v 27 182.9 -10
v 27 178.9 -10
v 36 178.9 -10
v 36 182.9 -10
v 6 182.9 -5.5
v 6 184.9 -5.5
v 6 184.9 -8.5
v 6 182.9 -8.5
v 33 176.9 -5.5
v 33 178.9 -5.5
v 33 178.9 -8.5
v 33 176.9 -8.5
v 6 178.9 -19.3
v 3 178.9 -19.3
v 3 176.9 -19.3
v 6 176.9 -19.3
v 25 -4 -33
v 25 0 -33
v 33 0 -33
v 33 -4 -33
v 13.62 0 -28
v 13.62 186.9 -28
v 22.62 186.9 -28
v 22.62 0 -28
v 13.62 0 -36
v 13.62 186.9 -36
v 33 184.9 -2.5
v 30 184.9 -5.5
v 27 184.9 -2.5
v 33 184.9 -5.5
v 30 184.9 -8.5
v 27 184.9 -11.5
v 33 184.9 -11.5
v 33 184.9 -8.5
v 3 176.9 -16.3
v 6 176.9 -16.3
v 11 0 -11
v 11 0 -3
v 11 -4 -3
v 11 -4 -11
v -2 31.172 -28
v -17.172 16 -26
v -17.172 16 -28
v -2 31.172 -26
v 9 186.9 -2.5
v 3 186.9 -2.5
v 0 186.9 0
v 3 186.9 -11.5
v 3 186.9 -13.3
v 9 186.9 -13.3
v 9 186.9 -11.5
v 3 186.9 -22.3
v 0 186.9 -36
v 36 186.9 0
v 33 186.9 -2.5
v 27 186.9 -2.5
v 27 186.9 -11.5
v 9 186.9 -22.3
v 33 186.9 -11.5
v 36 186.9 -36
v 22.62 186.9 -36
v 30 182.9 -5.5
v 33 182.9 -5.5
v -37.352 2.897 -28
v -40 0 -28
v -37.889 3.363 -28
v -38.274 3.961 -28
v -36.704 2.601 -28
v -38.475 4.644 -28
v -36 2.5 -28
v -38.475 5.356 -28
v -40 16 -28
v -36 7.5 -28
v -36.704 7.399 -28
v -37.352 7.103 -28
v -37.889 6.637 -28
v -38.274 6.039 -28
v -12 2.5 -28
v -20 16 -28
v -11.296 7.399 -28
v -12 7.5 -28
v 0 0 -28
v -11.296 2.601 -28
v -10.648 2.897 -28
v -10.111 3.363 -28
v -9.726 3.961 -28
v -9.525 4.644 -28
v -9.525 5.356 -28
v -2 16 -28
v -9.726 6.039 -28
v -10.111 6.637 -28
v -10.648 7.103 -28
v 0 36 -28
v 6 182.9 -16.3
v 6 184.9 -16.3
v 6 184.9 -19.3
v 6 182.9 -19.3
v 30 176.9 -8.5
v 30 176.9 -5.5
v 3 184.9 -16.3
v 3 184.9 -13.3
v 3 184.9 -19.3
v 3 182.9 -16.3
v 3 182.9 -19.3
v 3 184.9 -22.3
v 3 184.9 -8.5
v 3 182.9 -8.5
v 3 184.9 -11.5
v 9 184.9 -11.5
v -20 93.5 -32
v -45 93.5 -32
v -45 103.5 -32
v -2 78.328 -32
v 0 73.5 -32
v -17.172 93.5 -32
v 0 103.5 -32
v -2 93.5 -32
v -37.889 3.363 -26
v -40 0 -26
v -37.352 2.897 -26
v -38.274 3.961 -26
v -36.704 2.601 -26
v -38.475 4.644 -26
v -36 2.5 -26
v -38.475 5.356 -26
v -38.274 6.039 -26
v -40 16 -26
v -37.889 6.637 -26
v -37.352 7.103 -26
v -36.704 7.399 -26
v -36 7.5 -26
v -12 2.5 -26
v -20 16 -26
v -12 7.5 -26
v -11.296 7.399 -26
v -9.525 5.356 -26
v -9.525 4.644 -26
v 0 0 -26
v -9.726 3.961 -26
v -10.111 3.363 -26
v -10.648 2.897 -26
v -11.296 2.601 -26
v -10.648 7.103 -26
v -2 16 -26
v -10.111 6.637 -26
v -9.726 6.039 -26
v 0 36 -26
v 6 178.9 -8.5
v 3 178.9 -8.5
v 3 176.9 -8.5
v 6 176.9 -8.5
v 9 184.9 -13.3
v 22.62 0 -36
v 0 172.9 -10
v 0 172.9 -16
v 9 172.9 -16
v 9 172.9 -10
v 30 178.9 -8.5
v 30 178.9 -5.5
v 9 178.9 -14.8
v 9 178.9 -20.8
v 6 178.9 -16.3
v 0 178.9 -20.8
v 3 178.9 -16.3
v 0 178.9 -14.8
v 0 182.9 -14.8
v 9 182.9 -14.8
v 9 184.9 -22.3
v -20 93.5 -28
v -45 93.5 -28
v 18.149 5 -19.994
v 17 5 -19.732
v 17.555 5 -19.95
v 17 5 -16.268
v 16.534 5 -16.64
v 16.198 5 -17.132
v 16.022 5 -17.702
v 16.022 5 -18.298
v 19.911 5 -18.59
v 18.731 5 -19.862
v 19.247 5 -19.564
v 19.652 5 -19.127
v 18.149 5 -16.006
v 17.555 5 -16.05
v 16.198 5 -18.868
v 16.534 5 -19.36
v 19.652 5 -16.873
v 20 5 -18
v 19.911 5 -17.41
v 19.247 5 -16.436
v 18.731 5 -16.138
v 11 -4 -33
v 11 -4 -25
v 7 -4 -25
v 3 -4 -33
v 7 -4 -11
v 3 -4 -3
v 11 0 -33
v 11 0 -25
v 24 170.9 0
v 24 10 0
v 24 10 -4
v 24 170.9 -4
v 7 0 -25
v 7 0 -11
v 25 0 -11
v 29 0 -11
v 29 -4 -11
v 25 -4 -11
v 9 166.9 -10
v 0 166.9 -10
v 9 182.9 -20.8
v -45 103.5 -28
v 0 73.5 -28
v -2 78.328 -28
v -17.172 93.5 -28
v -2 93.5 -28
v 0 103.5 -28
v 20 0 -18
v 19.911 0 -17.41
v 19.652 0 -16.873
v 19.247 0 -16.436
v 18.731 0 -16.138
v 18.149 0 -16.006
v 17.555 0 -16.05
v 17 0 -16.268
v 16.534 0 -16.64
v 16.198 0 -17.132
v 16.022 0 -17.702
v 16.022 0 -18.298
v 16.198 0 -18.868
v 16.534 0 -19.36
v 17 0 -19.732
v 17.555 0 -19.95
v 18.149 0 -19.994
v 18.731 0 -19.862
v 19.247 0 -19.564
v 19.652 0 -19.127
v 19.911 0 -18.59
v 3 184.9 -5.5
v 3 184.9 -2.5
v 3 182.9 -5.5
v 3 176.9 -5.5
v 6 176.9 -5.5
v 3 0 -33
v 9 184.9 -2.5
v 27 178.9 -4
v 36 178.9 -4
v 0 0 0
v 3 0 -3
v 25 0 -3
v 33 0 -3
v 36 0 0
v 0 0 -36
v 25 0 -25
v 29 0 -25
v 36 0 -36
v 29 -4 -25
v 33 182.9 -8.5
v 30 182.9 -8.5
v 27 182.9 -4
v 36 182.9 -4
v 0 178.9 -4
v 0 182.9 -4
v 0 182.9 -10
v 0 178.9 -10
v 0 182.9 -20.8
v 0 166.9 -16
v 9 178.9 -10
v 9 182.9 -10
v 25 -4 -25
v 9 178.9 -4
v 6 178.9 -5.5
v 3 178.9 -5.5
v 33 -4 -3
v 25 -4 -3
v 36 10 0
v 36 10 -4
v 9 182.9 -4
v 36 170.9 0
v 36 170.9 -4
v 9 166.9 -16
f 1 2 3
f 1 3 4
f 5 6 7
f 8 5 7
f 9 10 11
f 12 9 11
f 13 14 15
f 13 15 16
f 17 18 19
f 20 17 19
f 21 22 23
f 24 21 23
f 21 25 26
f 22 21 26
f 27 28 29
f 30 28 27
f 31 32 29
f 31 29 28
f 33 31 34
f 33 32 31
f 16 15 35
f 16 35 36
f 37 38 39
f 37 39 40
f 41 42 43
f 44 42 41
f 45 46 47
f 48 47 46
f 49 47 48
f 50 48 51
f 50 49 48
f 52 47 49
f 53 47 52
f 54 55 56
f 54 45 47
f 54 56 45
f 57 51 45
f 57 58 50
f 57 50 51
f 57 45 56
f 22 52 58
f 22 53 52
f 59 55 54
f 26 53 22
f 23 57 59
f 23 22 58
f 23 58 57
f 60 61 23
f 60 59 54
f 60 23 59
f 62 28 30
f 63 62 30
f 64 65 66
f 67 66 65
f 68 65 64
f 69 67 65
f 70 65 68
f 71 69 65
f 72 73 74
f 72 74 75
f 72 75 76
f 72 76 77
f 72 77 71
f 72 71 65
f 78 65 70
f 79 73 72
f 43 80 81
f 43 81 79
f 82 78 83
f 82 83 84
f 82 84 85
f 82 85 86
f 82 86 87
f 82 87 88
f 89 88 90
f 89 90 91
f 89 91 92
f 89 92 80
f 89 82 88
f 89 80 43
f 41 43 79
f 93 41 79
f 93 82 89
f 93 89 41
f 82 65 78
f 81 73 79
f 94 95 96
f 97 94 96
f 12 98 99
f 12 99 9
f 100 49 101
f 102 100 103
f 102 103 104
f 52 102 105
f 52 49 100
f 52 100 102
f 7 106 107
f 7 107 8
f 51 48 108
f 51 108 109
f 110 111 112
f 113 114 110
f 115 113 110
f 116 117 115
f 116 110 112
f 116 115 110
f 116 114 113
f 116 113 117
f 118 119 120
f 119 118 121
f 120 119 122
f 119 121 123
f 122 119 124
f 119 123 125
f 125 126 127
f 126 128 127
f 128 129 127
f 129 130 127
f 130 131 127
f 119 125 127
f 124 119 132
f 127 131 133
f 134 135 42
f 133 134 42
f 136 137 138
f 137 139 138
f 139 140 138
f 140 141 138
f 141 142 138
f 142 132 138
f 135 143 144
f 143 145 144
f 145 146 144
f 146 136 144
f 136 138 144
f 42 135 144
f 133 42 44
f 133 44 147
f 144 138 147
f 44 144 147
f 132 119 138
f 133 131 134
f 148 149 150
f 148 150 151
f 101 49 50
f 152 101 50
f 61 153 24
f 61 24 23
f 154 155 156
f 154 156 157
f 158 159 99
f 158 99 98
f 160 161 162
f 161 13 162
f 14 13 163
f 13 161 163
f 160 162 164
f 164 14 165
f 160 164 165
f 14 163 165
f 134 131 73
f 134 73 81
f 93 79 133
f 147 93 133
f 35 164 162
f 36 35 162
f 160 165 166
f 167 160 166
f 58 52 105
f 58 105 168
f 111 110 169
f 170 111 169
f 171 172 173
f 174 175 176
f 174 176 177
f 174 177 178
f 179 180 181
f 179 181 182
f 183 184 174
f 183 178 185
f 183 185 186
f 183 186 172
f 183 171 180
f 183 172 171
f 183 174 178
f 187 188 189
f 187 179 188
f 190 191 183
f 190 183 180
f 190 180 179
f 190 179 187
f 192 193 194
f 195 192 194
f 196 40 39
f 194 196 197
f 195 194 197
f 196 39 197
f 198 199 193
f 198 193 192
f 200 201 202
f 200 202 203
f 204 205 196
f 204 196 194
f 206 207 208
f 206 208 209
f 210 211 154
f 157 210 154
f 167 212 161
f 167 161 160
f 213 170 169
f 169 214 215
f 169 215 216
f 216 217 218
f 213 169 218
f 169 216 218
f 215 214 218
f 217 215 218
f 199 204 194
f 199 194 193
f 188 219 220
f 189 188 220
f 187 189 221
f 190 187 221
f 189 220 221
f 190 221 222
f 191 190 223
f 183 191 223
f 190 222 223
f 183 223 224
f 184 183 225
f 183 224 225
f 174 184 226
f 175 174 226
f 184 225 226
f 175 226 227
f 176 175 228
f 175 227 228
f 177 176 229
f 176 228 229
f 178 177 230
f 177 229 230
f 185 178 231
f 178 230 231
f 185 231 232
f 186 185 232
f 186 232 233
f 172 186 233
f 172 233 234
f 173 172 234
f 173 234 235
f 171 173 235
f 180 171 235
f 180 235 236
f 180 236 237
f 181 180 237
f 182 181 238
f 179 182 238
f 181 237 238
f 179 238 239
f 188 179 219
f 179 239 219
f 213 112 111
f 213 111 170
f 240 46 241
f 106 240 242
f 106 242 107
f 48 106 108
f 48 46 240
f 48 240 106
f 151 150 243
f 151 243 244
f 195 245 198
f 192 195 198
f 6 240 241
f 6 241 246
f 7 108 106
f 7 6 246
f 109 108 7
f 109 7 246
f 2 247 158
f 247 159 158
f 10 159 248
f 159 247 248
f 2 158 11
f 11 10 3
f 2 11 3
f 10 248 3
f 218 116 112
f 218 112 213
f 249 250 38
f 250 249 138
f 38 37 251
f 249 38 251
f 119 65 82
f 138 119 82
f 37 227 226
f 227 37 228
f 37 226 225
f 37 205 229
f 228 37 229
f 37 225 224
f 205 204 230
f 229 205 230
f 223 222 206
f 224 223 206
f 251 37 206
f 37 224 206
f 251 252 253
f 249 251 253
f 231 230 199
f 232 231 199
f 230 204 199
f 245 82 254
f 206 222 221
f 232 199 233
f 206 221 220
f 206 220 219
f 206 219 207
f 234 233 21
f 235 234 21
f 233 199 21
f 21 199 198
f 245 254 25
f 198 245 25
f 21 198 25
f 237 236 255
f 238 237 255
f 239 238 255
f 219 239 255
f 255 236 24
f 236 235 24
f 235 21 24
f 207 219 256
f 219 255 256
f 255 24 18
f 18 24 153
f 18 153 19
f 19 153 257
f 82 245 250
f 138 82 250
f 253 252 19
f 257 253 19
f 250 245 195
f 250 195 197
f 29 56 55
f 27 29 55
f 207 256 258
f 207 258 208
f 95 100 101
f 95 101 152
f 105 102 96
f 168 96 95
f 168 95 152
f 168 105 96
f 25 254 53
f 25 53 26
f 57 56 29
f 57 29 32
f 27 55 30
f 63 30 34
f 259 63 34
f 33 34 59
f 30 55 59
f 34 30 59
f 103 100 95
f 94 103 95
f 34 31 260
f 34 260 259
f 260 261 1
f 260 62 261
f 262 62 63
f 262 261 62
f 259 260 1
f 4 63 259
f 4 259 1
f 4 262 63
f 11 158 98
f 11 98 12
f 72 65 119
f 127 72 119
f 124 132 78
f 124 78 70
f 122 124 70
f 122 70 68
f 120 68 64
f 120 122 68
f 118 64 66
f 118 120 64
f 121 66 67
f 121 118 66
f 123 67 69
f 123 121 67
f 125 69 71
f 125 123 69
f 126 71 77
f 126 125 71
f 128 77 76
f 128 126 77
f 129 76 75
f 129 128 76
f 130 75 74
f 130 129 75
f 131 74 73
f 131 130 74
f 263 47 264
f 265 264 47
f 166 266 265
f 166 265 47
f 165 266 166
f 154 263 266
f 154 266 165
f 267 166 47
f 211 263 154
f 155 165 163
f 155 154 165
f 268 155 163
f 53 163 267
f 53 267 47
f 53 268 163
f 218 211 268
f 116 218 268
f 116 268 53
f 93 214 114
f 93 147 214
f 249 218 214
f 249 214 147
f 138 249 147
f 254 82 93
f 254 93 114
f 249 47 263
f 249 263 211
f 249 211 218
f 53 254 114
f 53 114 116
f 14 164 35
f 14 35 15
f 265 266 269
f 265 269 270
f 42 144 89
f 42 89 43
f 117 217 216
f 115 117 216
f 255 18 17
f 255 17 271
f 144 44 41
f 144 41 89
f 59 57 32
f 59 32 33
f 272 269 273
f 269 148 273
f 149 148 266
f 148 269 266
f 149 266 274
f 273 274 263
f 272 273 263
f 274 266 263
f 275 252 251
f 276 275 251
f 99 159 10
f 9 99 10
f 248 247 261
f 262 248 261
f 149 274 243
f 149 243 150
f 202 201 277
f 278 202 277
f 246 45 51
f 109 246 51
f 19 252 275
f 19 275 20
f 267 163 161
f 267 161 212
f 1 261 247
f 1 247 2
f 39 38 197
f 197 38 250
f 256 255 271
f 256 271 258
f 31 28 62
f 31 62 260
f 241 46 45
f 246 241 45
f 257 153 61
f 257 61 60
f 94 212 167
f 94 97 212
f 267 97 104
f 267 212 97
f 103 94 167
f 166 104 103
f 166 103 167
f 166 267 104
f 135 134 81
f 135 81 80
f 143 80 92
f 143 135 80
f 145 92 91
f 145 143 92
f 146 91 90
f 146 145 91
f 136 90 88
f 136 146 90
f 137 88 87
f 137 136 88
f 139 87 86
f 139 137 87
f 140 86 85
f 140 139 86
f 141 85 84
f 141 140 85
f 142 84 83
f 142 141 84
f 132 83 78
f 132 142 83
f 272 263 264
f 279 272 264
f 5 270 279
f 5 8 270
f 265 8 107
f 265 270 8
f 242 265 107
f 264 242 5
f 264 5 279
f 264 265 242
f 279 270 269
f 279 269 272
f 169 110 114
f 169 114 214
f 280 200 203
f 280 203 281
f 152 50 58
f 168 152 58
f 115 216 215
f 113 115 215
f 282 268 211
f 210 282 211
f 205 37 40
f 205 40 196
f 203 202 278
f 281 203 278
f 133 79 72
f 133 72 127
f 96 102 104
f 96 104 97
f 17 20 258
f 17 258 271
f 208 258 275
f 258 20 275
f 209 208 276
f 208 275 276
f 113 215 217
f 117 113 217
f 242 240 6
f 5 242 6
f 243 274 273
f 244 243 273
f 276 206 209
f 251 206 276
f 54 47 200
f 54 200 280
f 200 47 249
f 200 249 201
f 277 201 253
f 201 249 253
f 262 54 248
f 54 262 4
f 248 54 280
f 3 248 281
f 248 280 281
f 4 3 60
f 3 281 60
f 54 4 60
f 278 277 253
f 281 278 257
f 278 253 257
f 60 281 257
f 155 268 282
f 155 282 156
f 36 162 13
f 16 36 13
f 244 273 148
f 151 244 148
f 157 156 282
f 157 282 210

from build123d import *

# Parameters (mm, degrees)
SKETCH1_W           = 36
SKETCH1_H           = 36
BOSS_EXTRUDE1_DEPTH = 186.9
BOSS_EXTRUDE2_DEPTH = 4
SKETCH3_R           = 2
CUT_EXTRUDE1_DEPTH  = 5
SKETCH4_W           = 9
SKETCH4_H           = 186.9
CUT_EXTRUDE2_DEPTH  = 8
SKETCH5_W           = 6
SKETCH5_H           = 4
CUT_EXTRUDE3_DEPTH  = 9
SKETCH6_W           = 3
SKETCH6_H           = 3
CUT_EXTRUDE4_DEPTH  = 10
SKETCH7_W           = 2
SKETCH7_H           = 16
BOSS_EXTRUDE3_DEPTH = 40
CUT_EXTRUDE5_REACH  = 12
SKETCH9_W           = 4
SKETCH9_H           = 10
BOSS_EXTRUDE4_DEPTH = 45
CHAMFER1_SIZE       = 20
CUT_EXTRUDE6_DEPTH  = 27
SKETCH11_W          = 6
SKETCH11_H          = 4
SKETCH11_H_2        = 6
CUT_EXTRUDE7_DEPTH  = 9
SKETCH12_W          = 3
SKETCH12_H          = 3
CUT_EXTRUDE8_DEPTH  = 10
SKETCH13_W          = 12
SKETCH13_H          = 160.9
CUT_EXTRUDE9_DEPTH  = 4
SKETCH14_W          = 6
SKETCH14_H          = 9
CUT_EXTRUDE10_DEPTH = 2


with BuildPart() as part:
    # Sketch1 → Boss-Extrude1 (new body)
    with BuildSketch(Plane(origin=(0, 0, 0), x_dir=(1, 0, 0), z_dir=(0, 1, 0))):
        with Locations((18, 18)):
            Rectangle(SKETCH1_W, SKETCH1_H)
    extrude(amount=BOSS_EXTRUDE1_DEPTH)

    # Sketch2 → Boss-Extrude2 (add)
    with BuildSketch(Plane.XZ):
        Polygon((3, -3), (7, -3), (11, -3), (11, -11), (7, -11), (7, -25), (11, -25), (11, -33), (7, -33), (3, -33), align=None)
        Polygon((29, -3), (33, -3), (33, -33), (29, -33), (25, -33), (25, -25), (29, -25), (29, -11), (25, -11), (25, -3), align=None)
    extrude(amount=BOSS_EXTRUDE2_DEPTH)

    # Sketch3 → Cut-Extrude1 (cut)
    with BuildSketch(Plane.XZ):
        with Locations((18, -18)):
            Circle(SKETCH3_R)
    extrude(amount=-CUT_EXTRUDE1_DEPTH, mode=Mode.SUBTRACT)

    # Sketch4 → Cut-Extrude2 (cut)
    with BuildSketch(Plane.XY.offset(-36)):
        with Locations((18.12, 93.45)):
            Rectangle(SKETCH4_W, SKETCH4_H)
    extrude(amount=CUT_EXTRUDE2_DEPTH, mode=Mode.SUBTRACT)

    # Sketch5 → Cut-Extrude3 (cut)
    with BuildSketch(Plane(origin=(36, 0, 0), x_dir=(0, 0, -1), z_dir=(1, 0, 0))):
        with Locations((7, 180.9)):
            Rectangle(SKETCH5_W, SKETCH5_H)
    extrude(amount=-CUT_EXTRUDE3_DEPTH, mode=Mode.SUBTRACT)

    # Sketch6 → Cut-Extrude4 (cut)
    with BuildSketch(Plane(origin=(0, 186.9, 0), x_dir=(1, 0, 0), z_dir=(0, 1, 0))):
        with Locations((31.5, 7)):
            Rectangle(SKETCH6_W, SKETCH6_H)
    extrude(amount=-CUT_EXTRUDE4_DEPTH, mode=Mode.SUBTRACT)

    # Sketch7 → Boss-Extrude3 (add)
    with BuildSketch(Plane.ZY):
        with Locations((-27, 8)):
            Rectangle(SKETCH7_W, SKETCH7_H)
    extrude(amount=BOSS_EXTRUDE3_DEPTH)

    # Sketch8 → Cut-Extrude5 (cut, up to next)
    with BuildSketch(Plane.XY.offset(-26), mode=Mode.PRIVATE) as cut_extrude5_sk1:
        with BuildLine():
            Line((-36, 7.5), (-12, 7.5))
            ThreePointArc((-12, 7.5), (-9.5, 5), (-12, 2.5))
            Line((-12, 2.5), (-36, 2.5))
            ThreePointArc((-36, 2.5), (-38.5, 5), (-36, 7.5))
        make_face()
    cut_extrude5_tool1 = extrude(cut_extrude5_sk1.sketch, amount=-CUT_EXTRUDE5_REACH, mode=Mode.PRIVATE) & part.part
    add(cut_extrude5_tool1.solids().sort_by_distance((-24, 5, -26))[0], mode=Mode.SUBTRACT)

    # Sketch9 → Boss-Extrude4 (add)
    with BuildSketch(Plane.ZY):
        with Locations((-30, 98.5)):
            Rectangle(SKETCH9_W, SKETCH9_H)
    extrude(amount=BOSS_EXTRUDE4_DEPTH)

    # Chamfer1
    chamfer1_edges = [part.edges().sort_by_distance(p)[0] for p in [
        (0, 16, -27),
        (0, 93.5, -30),
    ]]
    chamfer(chamfer1_edges, length=CHAMFER1_SIZE)

    # Sketch10 → Cut-Extrude6 (cut)
    with BuildSketch(Plane.XY.offset(-26)):
        Polygon((-17.171572875, 93.5), (-2, 78.328427125), (-2, 93.5), align=None)
        Polygon((-17.171572875, 16), (-2, 31.171572875), (-2, 16), align=None)
    extrude(amount=-CUT_EXTRUDE6_DEPTH, mode=Mode.SUBTRACT)

    # Sketch11 → Cut-Extrude7 (cut)
    with BuildSketch(Plane.ZY):
        with Locations((-7, 180.9)):
            Rectangle(SKETCH11_W, SKETCH11_H)
        with Locations((-17.8, 180.9)):
            Rectangle(SKETCH11_W, SKETCH11_H)
        with Locations((-13, 169.9)):
            Rectangle(SKETCH11_W, SKETCH11_H_2)
    extrude(amount=-CUT_EXTRUDE7_DEPTH, mode=Mode.SUBTRACT)

    # Sketch12 → Cut-Extrude8 (cut)
    with BuildSketch(Plane(origin=(0, 186.9, 0), x_dir=(1, 0, 0), z_dir=(0, 1, 0))):
        with Locations((4.5, 7)):
            Rectangle(SKETCH12_W, SKETCH12_H)
        with Locations((4.5, 17.8)):
            Rectangle(SKETCH12_W, SKETCH12_H)
    extrude(amount=-CUT_EXTRUDE8_DEPTH, mode=Mode.SUBTRACT)

    # Sketch13 → Cut-Extrude9 (cut)
    with BuildSketch(Plane.XY):
        with Locations((30, 90.45)):
            Rectangle(SKETCH13_W, SKETCH13_H)
    extrude(amount=-CUT_EXTRUDE9_DEPTH, mode=Mode.SUBTRACT)

    # Sketch14 → Cut-Extrude10 (cut)
    with BuildSketch(Plane(origin=(0, 186.9, 0), x_dir=(1, 0, 0), z_dir=(0, 1, 0))):
        with Locations((30, 7)):
            Rectangle(SKETCH14_W, SKETCH14_H)
        with Locations((6, 17.8)):
            Rectangle(SKETCH14_W, SKETCH14_H)
        with Locations((6, 7)):
            Rectangle(SKETCH14_W, SKETCH14_H)
    extrude(amount=-CUT_EXTRUDE10_DEPTH, mode=Mode.SUBTRACT)


solid = part.part
